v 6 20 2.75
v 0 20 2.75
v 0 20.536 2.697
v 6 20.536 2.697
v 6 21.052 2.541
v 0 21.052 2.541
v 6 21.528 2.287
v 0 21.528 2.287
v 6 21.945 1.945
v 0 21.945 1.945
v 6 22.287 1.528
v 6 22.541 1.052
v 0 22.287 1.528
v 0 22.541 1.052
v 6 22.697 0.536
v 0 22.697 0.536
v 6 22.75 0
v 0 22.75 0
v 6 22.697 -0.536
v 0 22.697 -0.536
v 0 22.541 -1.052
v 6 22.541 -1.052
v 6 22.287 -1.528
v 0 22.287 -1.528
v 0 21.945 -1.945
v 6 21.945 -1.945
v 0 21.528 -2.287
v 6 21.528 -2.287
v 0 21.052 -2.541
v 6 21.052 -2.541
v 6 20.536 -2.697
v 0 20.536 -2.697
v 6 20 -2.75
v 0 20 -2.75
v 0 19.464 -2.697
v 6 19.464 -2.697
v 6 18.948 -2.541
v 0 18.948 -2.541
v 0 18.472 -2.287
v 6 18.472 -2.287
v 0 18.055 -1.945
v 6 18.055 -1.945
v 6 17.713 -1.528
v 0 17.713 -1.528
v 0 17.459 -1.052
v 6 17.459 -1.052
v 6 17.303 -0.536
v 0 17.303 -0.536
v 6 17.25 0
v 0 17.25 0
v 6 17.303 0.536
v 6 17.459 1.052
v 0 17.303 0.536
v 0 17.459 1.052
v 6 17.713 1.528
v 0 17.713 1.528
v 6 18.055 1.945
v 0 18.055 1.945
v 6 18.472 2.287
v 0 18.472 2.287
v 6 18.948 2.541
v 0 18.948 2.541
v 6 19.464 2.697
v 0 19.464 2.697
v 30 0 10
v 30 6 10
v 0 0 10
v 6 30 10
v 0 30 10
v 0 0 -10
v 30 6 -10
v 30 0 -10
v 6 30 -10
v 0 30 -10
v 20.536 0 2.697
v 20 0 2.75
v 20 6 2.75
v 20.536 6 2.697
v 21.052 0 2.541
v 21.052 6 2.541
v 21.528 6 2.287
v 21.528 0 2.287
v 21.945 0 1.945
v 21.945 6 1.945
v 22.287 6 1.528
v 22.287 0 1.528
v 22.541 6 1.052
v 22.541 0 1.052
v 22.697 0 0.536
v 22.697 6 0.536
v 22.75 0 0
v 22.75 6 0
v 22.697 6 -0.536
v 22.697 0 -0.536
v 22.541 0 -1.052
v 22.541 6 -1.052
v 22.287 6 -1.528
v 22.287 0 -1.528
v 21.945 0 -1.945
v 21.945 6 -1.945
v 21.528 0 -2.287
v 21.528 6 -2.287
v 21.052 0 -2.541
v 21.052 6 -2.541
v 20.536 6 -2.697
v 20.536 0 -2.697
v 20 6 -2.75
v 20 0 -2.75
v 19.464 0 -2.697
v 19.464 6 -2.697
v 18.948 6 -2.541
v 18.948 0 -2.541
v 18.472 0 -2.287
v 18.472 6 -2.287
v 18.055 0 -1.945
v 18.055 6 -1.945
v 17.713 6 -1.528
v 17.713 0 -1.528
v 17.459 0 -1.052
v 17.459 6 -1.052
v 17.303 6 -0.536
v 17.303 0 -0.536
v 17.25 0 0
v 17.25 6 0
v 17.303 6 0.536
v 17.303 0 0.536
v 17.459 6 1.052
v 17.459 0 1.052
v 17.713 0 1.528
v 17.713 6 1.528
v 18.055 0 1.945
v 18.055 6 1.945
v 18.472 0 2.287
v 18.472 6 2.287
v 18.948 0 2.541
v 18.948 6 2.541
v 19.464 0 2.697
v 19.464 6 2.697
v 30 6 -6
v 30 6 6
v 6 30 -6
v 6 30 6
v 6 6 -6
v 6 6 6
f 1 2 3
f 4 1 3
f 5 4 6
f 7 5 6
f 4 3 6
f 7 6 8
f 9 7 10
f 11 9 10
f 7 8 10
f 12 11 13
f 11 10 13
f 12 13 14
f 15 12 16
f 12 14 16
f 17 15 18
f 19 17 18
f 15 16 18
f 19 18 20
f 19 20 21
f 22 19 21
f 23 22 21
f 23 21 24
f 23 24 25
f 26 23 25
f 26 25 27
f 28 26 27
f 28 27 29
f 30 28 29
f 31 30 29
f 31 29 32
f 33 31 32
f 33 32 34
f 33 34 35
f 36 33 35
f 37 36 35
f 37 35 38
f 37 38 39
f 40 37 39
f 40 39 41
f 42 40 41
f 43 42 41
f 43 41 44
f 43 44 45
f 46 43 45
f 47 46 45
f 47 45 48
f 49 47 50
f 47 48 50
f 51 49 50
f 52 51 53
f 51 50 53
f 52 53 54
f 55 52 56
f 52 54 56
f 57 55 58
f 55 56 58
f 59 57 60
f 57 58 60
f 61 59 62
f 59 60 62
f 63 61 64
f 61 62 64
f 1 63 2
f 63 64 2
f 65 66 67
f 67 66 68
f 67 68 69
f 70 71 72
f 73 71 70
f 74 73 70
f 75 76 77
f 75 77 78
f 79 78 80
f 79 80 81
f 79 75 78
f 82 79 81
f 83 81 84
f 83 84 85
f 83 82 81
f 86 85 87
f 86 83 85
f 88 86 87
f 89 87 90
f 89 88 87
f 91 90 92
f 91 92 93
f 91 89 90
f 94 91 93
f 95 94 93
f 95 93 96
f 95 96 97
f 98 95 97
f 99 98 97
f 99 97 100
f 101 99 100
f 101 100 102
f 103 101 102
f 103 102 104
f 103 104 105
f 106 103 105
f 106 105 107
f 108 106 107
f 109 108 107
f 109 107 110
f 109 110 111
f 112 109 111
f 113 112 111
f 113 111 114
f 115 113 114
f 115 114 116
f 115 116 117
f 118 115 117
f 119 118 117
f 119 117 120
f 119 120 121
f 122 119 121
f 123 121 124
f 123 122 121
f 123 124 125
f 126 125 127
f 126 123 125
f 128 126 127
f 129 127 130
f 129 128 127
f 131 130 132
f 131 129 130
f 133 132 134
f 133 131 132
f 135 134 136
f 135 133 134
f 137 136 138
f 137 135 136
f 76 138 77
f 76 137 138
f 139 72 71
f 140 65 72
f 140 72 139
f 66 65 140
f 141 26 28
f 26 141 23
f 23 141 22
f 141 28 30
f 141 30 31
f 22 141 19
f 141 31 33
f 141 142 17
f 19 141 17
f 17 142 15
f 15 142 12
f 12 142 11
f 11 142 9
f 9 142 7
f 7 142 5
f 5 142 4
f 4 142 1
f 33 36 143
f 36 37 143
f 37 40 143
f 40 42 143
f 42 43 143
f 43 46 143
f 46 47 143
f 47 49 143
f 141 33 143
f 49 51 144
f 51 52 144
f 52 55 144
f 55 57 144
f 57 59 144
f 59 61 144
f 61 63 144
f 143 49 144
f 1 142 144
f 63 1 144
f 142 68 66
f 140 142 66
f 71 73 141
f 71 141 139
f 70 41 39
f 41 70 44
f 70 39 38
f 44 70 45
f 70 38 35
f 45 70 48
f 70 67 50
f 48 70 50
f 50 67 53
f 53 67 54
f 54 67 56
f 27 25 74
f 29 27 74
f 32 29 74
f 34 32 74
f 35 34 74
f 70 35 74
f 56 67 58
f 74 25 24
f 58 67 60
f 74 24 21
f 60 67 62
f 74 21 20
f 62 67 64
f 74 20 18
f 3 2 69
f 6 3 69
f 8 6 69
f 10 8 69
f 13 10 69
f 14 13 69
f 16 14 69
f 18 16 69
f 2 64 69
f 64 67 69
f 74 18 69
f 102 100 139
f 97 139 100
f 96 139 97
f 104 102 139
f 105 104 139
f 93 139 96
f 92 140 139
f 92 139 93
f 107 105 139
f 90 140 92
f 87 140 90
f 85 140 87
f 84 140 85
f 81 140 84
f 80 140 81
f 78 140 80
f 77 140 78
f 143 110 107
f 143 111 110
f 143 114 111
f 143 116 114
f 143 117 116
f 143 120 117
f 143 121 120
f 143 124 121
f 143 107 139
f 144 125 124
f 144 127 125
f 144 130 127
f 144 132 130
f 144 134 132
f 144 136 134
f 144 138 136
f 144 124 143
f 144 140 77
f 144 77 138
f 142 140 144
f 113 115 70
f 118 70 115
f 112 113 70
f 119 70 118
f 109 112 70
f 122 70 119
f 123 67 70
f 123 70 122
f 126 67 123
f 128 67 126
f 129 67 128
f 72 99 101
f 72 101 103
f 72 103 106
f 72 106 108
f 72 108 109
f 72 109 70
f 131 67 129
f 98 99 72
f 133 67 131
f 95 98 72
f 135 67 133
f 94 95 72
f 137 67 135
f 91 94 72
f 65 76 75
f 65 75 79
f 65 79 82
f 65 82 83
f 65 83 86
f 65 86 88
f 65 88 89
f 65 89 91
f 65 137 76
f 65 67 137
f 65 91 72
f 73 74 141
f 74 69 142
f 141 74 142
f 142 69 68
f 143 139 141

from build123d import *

# Parameters (mm, degrees)
BOSS_EXTRUDE1_DEPTH  = 10
M5_CLEARANCE_HOLE1_D = 5.5
GUSSET1_THICKNESS    = 4


with BuildPart() as part:
    # Sketch1 → Boss-Extrude1 (new, symmetric)
    with BuildSketch(Plane.XY):
        Polygon((0, 0), (0, 30), (6, 30), (6, 6), align=None)
    extrude(amount=BOSS_EXTRUDE1_DEPTH, both=True)

    # M5 Clearance Hole1 (through all)
    with Locations(Plane(origin=(6, 0, 0), x_dir=(0, 0, -1), z_dir=(1, 0, 0))):
        with Locations((0, 20)):
            Hole(M5_CLEARANCE_HOLE1_D / 2)

    # Mirror1: part across plane


with BuildPart() as part_1:
    add(part.part)
    add(part.part.mirror(Plane(origin=(0, 0, 10), x_dir=(0, 0, 1), z_dir=(0.7071067811865476, -0.7071067811865476, 0))))


with BuildPart() as body_2:
    # Gusset1: a gusset: a plate 4.0 thick in the corner of two members, its outline drawn in place
    gusset1_outline = Wire([Line((6, 6, -10), (6, 30, -10)), Line((6, 30, -10), (30, 6, -10)), Line((30, 6, -10), (6, 6, -10))])
    add(extrude(Face(gusset1_outline), amount=GUSSET1_THICKNESS, dir=(0, 0, 1)))


with BuildPart() as body_3:
    # Mirror3: mirrored copy
    add(body_2.part.mirror(Plane.XY))


with BuildPart() as part_2:
    add(part_1.part)

    # Combine1: union body 3, body 2
    add(body_3.part)
    add(body_2.part)


solid = part_2.part
